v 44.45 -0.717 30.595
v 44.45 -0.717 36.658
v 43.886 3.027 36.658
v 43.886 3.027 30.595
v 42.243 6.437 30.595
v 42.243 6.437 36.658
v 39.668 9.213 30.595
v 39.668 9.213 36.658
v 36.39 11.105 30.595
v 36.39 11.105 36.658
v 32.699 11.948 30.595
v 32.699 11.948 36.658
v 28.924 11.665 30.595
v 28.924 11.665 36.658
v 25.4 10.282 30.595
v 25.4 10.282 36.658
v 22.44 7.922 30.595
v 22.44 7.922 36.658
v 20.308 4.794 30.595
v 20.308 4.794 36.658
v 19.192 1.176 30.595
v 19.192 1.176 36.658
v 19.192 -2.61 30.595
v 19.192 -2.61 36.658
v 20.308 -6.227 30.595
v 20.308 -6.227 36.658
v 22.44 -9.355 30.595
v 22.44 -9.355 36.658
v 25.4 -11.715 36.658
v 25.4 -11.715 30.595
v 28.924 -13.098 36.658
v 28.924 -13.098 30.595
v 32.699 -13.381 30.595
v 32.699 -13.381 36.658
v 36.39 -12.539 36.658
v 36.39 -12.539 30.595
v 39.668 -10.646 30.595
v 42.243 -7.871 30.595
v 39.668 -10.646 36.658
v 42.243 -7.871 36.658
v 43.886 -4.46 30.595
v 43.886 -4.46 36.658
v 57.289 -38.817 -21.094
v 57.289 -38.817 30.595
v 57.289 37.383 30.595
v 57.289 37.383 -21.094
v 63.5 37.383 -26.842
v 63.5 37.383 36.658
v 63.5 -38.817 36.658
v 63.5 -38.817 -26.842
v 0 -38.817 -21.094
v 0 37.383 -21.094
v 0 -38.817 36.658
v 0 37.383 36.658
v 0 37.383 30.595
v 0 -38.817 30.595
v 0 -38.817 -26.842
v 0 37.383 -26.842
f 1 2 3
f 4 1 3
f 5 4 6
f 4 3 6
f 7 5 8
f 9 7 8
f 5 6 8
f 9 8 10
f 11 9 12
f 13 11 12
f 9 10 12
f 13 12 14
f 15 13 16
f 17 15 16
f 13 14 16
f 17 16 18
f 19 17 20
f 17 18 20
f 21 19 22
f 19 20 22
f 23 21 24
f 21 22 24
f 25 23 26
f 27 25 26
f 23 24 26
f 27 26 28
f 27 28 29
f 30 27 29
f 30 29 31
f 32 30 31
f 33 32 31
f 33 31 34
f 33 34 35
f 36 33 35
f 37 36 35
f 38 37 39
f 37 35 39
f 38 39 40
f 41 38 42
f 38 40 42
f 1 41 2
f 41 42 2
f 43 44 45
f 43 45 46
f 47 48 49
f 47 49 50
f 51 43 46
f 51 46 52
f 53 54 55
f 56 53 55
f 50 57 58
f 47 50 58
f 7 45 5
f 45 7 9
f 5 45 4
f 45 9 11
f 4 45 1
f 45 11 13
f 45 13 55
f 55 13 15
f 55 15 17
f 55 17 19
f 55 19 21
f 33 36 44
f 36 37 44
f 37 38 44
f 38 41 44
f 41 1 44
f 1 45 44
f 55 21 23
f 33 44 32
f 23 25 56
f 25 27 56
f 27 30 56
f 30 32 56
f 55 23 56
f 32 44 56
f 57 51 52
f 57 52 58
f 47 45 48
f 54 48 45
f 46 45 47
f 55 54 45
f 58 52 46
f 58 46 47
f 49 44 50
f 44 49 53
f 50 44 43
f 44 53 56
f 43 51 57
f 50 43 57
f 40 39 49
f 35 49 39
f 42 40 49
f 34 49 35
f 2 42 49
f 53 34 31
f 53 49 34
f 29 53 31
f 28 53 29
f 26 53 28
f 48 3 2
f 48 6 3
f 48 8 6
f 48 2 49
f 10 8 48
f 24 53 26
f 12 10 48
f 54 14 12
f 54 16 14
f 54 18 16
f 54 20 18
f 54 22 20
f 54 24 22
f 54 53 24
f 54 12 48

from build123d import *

# Parameters (mm, degrees)
SKETCH3_W           = 63.5
SKETCH3_H           = 76.2
BOSS_EXTRUDE1_DEPTH = 63.5
SKETCH20_W          = 57.288750963
SKETCH20_H          = 51.688361778
CUT_EXTRUDE2_DEPTH  = 106.747278632
SKETCH21_R          = 12.7
CUT_EXTRUDE4_DEPTH  = 6.063211567


with BuildPart() as part:
    # Sketch3 → Boss-Extrude1 (new body)
    with BuildSketch(Plane(origin=(0, 0, 0), x_dir=(0, 0, -1), z_dir=(1, 0, 0))):
        with Locations((-4.90783597, -0.71667611)):
            Rectangle(SKETCH3_W, SKETCH3_H)
    extrude(amount=BOSS_EXTRUDE1_DEPTH)

    # Sketch20 → Cut-Extrude2 (cut, through all)
    with BuildSketch(Plane(origin=(0, -38.81667611, 0), x_dir=(-1, 0, 0), z_dir=(0, -1, 0))):
        with Locations((-28.644375482, -4.750443514)):
            Rectangle(SKETCH20_W, SKETCH20_H)
    extrude(amount=-CUT_EXTRUDE2_DEPTH, mode=Mode.SUBTRACT)

    # Sketch21 → Cut-Extrude4 (cut)
    with BuildSketch(Plane.XY.offset(36.65783597)):
        with Locations((31.75, -0.71667611)):
            Circle(SKETCH21_R)
    extrude(amount=-CUT_EXTRUDE4_DEPTH, mode=Mode.SUBTRACT)


solid = part.part
